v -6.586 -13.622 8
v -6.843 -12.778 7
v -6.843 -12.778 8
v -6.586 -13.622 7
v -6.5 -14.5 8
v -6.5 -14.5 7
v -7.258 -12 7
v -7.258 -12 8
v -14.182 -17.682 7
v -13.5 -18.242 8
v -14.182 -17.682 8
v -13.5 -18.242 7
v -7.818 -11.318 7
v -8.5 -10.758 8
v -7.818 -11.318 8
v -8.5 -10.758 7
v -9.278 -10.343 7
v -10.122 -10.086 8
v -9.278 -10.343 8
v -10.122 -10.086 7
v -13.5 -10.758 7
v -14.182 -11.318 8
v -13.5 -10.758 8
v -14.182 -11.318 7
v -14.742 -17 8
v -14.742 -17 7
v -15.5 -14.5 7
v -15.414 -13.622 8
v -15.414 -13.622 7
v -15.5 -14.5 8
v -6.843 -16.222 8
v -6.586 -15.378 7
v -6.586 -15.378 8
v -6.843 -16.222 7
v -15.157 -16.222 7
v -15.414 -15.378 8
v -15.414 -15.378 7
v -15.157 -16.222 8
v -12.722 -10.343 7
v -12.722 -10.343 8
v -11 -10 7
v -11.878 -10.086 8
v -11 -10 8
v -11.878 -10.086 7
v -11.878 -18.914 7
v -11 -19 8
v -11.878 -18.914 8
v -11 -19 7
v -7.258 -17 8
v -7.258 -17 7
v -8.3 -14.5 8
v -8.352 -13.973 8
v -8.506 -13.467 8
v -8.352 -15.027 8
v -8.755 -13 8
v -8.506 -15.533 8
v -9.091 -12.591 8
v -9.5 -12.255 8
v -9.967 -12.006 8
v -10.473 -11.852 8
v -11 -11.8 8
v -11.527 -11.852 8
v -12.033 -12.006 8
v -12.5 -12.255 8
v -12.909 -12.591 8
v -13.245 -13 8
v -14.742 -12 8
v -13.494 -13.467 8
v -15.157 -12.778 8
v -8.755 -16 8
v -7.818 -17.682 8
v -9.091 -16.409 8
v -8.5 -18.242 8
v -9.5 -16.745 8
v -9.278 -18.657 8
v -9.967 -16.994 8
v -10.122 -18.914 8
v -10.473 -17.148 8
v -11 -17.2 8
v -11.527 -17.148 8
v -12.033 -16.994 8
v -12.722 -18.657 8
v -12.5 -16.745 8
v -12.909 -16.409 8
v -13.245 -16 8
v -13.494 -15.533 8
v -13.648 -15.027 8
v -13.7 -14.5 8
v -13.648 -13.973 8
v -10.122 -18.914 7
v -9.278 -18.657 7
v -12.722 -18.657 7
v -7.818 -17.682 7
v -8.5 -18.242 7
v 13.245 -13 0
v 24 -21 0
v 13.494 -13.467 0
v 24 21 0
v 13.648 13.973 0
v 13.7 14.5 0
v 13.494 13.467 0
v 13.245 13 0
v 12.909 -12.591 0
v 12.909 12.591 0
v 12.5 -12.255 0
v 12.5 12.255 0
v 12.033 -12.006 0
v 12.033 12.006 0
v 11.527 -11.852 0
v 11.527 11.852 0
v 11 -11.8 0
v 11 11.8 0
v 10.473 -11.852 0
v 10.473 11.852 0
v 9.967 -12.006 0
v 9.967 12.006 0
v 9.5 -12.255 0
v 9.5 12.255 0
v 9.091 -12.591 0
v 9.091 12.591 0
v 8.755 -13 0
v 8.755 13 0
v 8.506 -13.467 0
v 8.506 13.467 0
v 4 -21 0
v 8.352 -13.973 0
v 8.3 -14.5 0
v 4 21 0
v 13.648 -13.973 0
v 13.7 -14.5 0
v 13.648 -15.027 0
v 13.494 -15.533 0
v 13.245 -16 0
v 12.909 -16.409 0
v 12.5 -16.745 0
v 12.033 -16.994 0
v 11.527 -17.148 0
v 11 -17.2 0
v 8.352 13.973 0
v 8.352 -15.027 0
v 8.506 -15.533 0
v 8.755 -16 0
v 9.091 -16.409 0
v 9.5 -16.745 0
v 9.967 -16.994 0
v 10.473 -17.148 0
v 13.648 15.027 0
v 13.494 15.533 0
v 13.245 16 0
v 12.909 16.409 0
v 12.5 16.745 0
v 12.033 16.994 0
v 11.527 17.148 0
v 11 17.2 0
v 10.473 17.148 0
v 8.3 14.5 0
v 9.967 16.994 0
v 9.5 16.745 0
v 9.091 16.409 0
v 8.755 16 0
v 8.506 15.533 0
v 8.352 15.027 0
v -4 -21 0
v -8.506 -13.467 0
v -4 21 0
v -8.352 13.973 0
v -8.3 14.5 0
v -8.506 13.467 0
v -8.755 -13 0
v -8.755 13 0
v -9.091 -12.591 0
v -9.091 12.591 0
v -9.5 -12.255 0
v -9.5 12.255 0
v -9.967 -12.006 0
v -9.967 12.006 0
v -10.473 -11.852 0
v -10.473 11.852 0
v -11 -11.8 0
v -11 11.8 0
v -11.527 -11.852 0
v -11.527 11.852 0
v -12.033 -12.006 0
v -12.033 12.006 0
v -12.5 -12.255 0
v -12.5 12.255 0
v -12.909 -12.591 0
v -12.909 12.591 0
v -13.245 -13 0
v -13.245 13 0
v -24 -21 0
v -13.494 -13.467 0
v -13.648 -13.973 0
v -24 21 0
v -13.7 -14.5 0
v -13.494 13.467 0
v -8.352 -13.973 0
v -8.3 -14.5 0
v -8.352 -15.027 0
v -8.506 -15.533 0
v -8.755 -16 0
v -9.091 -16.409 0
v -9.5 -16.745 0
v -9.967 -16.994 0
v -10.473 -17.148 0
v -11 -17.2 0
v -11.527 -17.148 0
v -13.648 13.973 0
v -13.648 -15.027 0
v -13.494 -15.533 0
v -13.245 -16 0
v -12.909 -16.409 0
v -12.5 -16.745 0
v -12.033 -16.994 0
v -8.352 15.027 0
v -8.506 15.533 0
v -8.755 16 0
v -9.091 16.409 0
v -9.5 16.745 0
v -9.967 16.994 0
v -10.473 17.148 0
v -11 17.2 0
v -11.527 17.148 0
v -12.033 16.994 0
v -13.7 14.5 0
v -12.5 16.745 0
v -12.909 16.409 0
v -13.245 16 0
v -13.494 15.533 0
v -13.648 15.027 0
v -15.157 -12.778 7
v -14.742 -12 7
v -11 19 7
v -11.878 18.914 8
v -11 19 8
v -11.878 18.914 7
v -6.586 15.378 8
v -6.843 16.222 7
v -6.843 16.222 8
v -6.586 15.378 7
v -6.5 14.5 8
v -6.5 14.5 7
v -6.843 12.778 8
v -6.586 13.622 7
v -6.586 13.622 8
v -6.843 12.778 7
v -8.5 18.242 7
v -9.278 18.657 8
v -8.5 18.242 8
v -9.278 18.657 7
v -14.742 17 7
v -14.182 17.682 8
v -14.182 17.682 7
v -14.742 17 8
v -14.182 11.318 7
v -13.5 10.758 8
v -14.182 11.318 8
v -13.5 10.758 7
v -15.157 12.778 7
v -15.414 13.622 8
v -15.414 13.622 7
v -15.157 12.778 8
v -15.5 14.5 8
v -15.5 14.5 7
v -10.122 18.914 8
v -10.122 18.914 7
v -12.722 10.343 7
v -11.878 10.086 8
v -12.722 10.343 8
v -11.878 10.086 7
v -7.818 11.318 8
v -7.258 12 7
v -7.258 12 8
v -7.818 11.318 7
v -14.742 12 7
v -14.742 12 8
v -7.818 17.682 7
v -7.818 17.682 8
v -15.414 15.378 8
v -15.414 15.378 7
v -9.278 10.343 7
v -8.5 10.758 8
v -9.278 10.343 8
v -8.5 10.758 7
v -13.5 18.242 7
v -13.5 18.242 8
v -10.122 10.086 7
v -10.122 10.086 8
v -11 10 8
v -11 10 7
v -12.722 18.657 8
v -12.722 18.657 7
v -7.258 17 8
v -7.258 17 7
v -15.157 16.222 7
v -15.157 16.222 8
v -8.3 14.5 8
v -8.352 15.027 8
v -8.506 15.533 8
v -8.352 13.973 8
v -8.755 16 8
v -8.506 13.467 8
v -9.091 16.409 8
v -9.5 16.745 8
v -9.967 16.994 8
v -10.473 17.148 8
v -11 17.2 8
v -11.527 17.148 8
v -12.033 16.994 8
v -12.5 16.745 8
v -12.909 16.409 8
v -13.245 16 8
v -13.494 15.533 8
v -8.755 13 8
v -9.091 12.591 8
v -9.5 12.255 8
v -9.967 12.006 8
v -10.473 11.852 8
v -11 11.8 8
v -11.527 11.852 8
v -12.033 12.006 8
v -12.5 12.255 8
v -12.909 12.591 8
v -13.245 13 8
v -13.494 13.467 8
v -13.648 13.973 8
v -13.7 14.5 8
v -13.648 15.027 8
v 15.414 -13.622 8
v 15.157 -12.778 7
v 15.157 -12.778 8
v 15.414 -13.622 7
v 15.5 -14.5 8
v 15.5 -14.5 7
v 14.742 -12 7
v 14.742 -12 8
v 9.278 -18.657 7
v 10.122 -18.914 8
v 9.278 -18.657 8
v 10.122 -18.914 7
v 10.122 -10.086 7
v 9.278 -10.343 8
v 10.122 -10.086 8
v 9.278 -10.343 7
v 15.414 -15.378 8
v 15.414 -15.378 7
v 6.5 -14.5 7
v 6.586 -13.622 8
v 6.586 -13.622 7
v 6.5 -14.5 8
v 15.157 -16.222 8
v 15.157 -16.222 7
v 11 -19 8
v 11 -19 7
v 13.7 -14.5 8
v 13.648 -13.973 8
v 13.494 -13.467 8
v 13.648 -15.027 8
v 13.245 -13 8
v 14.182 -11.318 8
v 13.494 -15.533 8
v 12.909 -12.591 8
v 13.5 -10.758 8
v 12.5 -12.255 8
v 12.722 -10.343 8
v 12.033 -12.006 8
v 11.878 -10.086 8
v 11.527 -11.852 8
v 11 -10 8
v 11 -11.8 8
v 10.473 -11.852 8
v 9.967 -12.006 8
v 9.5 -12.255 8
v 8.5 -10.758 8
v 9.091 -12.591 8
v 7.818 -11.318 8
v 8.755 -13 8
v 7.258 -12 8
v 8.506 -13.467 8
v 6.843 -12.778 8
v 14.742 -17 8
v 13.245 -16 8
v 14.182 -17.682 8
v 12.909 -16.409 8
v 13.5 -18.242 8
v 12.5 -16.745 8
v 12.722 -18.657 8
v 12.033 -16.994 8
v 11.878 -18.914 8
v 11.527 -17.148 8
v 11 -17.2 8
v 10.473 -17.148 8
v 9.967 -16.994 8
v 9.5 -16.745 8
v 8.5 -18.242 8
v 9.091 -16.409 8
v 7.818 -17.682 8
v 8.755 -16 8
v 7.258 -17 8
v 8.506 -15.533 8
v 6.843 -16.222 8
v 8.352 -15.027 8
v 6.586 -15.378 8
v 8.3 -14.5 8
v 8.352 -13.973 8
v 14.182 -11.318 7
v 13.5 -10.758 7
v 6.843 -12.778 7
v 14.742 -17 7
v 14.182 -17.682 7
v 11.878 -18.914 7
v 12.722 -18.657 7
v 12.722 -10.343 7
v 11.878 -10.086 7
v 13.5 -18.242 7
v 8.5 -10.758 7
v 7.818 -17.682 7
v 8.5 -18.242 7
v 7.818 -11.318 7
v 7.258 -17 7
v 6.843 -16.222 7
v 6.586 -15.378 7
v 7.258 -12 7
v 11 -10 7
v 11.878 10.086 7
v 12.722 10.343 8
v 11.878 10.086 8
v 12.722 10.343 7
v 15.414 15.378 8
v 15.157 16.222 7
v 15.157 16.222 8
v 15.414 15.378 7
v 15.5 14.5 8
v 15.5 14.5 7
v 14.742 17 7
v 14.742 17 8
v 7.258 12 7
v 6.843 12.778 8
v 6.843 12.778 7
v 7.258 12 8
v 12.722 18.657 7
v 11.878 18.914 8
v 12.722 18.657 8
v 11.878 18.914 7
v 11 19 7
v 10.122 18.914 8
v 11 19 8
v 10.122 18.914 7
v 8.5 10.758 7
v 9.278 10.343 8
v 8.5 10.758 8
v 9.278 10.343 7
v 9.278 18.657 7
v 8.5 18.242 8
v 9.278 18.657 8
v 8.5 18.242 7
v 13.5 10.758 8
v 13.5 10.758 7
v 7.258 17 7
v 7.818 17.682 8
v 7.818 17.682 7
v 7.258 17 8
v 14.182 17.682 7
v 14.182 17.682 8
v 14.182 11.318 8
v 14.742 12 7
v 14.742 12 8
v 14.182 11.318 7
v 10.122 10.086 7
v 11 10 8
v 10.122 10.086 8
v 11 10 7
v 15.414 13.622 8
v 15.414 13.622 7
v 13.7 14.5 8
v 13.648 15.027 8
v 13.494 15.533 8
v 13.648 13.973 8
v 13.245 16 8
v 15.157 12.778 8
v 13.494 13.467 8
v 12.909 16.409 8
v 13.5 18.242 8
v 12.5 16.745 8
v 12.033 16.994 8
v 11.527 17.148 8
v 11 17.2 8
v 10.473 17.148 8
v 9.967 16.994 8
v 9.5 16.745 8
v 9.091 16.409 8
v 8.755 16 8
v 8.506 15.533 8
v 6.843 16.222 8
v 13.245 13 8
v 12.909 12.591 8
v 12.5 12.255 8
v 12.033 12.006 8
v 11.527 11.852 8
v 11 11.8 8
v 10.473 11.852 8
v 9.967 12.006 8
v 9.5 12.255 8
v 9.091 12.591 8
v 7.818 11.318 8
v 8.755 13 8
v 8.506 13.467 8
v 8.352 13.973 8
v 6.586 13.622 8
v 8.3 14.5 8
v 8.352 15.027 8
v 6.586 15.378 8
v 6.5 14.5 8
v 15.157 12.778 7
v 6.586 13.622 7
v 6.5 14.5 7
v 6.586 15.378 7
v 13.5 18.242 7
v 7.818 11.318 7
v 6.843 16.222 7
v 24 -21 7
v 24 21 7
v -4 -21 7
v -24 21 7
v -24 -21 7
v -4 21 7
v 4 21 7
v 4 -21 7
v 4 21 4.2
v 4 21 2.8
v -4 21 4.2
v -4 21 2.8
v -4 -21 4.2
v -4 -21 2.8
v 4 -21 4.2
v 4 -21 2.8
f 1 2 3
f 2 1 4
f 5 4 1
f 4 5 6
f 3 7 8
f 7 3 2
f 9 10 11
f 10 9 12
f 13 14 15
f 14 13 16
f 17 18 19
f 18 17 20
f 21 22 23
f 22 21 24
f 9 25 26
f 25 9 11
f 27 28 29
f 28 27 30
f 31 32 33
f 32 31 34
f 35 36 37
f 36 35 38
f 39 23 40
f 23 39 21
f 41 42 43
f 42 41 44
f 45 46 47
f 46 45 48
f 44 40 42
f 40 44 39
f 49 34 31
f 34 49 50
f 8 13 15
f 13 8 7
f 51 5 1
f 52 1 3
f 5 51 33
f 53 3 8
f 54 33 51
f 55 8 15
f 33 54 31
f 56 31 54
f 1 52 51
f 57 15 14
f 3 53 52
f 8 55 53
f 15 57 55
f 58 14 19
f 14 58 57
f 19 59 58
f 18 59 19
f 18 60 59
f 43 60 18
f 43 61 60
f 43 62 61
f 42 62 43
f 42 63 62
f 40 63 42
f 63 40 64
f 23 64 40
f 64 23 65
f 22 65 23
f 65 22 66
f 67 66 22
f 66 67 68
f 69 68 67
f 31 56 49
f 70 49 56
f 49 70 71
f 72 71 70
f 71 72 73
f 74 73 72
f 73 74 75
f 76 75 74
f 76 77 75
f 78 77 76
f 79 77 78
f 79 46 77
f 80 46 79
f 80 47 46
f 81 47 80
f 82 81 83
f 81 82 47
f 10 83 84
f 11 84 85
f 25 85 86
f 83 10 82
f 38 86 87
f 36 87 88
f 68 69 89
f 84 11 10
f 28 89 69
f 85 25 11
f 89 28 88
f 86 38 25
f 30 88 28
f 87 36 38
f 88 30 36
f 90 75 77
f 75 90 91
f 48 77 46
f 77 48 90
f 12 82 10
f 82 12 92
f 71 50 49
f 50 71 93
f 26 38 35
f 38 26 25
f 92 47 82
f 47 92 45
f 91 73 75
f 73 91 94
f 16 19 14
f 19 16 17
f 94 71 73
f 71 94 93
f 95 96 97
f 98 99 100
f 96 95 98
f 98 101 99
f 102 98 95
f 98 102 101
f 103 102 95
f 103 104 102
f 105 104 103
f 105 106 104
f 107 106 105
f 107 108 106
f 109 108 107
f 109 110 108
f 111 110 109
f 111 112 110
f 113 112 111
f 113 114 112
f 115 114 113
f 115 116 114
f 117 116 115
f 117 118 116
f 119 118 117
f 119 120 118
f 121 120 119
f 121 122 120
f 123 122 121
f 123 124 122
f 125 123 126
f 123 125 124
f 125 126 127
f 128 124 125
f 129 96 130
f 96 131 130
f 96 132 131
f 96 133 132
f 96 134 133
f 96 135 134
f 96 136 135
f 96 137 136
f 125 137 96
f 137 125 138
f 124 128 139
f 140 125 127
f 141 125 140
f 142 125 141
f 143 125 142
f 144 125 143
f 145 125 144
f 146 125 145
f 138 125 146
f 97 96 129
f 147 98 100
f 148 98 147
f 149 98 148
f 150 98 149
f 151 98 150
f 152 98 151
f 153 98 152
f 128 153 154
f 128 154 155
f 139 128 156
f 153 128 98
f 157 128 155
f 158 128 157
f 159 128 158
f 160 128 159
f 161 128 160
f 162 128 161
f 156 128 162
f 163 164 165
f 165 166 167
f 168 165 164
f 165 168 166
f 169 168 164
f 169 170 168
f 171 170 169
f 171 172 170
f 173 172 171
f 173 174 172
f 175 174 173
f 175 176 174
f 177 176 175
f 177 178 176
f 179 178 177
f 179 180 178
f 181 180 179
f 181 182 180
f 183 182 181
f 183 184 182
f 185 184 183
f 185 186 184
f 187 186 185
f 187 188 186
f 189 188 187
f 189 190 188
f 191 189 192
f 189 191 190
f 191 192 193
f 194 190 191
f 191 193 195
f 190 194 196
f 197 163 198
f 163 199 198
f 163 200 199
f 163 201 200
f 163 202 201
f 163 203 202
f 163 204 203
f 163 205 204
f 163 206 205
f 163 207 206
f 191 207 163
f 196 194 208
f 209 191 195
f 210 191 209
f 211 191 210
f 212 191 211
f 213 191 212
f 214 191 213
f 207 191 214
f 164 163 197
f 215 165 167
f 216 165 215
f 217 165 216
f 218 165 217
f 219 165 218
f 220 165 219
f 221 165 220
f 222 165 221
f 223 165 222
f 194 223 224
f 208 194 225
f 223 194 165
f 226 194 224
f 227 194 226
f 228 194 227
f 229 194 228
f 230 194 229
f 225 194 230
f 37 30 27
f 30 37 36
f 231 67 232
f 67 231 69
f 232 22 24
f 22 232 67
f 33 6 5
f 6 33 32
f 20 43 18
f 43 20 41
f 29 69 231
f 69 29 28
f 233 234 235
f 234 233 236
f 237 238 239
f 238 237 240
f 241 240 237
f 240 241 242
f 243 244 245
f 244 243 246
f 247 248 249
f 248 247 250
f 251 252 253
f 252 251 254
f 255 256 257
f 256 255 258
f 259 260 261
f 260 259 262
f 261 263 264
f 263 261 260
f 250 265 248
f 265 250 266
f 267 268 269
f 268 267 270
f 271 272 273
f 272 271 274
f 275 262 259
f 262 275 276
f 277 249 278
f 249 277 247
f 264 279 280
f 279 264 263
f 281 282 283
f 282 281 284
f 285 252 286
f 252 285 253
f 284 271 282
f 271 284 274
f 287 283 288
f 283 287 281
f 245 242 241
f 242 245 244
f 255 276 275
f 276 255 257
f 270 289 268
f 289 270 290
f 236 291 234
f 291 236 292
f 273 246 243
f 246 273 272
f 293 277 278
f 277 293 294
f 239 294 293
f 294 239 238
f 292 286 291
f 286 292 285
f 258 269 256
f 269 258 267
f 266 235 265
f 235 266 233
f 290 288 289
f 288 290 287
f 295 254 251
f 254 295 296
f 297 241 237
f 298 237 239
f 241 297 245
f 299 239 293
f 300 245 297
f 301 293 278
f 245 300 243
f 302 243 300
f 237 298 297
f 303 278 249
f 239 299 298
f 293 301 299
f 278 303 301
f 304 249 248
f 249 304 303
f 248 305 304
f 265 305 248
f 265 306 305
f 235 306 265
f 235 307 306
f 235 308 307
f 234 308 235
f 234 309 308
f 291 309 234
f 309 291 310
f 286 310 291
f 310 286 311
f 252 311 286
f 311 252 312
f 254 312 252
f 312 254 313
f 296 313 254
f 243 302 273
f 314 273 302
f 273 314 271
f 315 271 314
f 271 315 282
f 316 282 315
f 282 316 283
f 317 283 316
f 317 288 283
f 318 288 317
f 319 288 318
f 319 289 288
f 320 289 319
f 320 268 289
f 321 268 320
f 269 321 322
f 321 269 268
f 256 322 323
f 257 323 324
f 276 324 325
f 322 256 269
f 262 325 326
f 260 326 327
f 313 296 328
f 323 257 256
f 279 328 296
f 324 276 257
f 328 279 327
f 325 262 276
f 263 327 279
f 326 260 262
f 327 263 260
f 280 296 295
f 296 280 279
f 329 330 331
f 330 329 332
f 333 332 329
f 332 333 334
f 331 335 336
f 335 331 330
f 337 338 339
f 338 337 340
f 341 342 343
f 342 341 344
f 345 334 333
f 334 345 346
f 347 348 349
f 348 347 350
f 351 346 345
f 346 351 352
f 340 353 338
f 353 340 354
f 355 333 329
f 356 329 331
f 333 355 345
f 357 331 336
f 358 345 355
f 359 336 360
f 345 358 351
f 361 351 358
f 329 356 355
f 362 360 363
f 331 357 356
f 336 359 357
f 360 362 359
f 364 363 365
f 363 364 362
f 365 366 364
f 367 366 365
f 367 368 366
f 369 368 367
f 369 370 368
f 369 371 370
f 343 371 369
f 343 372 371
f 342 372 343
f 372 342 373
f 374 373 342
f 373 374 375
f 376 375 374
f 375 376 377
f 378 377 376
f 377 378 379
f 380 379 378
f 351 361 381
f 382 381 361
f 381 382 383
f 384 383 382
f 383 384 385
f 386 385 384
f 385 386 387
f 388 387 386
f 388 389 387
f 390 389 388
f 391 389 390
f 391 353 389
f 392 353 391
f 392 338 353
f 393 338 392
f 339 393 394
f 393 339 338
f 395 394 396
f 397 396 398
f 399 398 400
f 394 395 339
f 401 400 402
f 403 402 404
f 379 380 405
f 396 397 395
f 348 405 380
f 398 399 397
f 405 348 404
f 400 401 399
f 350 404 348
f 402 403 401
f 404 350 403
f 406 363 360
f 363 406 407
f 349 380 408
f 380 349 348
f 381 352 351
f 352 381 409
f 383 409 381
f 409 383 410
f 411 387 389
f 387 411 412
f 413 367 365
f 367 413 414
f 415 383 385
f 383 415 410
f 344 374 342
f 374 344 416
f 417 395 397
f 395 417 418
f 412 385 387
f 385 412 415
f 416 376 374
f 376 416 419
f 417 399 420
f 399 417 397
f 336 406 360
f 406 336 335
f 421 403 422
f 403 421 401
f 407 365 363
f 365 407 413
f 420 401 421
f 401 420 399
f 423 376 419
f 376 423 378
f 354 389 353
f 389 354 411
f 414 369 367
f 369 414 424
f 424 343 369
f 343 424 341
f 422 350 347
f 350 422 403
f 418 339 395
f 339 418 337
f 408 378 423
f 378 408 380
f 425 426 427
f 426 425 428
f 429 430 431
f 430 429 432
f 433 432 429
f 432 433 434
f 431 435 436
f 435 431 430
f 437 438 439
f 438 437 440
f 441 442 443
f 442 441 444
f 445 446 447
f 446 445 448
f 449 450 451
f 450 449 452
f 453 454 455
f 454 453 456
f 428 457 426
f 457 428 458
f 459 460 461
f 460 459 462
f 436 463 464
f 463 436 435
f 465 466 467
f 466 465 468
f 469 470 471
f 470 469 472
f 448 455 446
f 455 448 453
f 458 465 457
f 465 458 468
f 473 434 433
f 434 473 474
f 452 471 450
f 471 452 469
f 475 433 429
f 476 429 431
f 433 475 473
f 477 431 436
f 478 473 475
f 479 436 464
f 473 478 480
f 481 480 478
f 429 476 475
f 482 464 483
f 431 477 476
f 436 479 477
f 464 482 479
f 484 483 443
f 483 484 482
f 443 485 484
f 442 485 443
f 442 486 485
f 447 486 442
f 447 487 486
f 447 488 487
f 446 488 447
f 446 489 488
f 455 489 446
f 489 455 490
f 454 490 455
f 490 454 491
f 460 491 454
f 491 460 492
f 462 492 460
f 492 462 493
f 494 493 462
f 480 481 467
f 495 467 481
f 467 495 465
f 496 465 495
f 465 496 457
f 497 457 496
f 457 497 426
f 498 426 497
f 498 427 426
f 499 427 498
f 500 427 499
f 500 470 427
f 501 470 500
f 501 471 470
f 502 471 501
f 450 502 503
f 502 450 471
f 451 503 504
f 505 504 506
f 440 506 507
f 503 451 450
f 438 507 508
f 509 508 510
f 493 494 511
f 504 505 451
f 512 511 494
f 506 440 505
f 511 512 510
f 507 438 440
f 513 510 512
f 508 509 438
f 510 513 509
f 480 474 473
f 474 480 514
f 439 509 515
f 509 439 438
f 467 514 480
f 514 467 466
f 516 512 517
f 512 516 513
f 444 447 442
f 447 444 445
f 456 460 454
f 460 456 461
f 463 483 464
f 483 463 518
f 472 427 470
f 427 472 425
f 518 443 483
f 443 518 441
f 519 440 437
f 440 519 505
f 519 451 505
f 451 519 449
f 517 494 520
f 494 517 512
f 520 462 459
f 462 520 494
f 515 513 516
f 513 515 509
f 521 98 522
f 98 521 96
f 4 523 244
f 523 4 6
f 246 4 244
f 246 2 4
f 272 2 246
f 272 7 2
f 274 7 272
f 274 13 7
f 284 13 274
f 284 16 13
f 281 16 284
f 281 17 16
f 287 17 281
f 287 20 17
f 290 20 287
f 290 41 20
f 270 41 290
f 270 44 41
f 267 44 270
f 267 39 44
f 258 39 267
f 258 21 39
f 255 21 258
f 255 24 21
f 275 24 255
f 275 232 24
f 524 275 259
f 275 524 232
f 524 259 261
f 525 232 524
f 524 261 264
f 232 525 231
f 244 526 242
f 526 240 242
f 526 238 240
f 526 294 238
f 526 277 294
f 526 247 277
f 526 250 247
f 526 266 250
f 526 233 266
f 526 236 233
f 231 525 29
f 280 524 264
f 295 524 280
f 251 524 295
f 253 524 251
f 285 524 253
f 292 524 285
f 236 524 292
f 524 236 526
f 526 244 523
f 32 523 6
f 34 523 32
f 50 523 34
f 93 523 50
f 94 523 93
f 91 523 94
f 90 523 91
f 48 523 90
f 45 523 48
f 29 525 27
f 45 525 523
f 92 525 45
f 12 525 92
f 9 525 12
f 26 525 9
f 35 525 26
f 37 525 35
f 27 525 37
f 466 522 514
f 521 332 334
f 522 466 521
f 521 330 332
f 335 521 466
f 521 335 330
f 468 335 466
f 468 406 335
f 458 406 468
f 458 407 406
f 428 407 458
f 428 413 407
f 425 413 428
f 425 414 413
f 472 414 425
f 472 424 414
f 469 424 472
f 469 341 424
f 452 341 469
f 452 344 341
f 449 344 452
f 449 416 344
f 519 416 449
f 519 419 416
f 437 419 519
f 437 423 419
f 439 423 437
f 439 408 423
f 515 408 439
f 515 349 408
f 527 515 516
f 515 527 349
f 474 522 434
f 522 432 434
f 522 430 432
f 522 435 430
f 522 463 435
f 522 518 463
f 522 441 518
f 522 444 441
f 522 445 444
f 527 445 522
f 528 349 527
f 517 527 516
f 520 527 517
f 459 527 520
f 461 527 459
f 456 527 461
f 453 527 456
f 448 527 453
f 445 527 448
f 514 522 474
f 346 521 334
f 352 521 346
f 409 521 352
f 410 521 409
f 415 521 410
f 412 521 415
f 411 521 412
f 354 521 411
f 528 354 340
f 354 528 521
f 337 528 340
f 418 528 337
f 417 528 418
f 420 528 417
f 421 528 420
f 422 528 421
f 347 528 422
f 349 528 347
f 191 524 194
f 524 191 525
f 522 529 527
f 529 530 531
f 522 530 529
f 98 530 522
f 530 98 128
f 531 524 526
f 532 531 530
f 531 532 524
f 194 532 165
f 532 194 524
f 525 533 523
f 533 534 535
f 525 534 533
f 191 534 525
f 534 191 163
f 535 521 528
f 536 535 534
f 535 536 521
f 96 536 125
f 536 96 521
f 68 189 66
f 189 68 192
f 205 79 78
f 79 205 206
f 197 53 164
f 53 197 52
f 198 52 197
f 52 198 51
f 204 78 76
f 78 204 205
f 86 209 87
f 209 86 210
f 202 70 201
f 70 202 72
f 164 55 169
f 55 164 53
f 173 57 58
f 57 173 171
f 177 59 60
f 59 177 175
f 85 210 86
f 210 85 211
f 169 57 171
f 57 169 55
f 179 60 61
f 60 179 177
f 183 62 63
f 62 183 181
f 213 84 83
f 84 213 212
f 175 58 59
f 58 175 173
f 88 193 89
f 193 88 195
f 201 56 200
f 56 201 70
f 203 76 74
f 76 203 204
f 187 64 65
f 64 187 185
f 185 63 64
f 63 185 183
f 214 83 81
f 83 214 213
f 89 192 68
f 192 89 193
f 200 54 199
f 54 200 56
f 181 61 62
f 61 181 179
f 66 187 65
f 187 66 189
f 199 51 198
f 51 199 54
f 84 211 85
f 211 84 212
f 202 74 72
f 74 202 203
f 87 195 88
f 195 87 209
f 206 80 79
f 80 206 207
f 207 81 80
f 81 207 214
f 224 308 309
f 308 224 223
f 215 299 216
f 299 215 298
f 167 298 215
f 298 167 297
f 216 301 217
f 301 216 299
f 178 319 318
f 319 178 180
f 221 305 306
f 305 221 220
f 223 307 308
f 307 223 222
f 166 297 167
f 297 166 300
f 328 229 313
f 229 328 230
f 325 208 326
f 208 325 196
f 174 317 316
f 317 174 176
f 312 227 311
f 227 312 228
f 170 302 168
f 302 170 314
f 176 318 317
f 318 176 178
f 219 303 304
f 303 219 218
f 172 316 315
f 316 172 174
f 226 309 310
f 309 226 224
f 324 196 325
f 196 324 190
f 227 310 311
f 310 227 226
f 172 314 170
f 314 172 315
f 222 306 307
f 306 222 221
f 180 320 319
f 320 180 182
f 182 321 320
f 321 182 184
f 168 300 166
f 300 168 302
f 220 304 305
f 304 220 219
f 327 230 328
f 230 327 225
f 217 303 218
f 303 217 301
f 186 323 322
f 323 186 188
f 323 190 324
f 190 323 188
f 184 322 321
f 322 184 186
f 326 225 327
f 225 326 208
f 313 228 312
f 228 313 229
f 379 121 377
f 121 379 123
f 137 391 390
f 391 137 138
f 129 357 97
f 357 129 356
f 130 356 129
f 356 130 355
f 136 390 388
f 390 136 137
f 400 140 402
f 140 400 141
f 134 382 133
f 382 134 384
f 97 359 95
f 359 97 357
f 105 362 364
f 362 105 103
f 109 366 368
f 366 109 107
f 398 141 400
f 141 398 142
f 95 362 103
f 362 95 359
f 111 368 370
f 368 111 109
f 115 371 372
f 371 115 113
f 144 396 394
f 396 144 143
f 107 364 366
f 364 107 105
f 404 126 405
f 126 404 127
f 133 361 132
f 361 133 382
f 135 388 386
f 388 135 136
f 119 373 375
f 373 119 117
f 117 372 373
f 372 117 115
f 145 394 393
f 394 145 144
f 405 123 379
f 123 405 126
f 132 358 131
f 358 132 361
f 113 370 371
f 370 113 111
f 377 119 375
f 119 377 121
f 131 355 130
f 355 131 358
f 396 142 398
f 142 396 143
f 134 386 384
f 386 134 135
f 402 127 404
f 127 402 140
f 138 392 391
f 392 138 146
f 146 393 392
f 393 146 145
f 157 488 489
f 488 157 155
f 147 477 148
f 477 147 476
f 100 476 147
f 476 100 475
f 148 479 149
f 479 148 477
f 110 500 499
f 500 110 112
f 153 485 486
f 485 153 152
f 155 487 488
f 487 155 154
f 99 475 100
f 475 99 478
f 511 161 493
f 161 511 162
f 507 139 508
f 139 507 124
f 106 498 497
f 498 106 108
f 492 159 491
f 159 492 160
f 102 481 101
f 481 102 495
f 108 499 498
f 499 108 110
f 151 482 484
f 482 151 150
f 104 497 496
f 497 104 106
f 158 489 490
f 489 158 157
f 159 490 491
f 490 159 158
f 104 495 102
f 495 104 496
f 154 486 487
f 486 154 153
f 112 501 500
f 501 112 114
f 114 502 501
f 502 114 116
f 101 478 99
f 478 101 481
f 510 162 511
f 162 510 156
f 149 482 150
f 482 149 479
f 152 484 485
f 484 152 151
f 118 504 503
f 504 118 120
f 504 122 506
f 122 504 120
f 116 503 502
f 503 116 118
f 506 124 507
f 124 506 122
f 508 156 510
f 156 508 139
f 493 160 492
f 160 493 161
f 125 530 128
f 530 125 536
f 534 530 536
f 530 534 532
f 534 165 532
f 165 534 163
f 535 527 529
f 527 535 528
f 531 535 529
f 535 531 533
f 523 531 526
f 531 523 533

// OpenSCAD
$fn = 32;

// ----------------------------------------------------------------------
// Living hinge: 48 x 42 mm plates, 1.4 mm flexible web
// ----------------------------------------------------------------------

// --- parameters (mm) ---
plate_len = 20;           // plate length outside the web
plate_w = 42;             // plate width
thick = 7;                // plate thickness
web_half = 4;             // half width of the flex band
web_t = 1.4;              // flexible web thickness
web_z = 2.8;              // web position inside the thickness
boss_d = 9;               // screw boss diameter
boss_h = 8;               // screw boss height
boss_x = 11;              // screw boss distance from the web
screw_d = 5.4;            // screw hole

difference() {
  union() {
    /* one flat strip, later thinned at the middle */
    translate([-24, -21, 0]) cube([48, 42, 7]);
    /* screw bosses, sunk 0.5 mm into the plates */
    for (sx = [-11, 11]) {
      for (sy = [-14.5, 14.5]) {
        translate([sx, sy, 0]) cylinder(h = boss_h, d = boss_d);
      }
    }
  }
  /* channel from below: leaves the web on top of it */
  translate([-4, -23.5, -2.5]) cube([8, 47, 5.3]);
  /* channel from above: thins the web down to web_t */
  translate([-4, -23.5, 4.2]) cube([8, 47, 5.3]);
  /* screw holes through the bosses */
  for (sx = [-11, 11]) {
    for (sy = [-14.5, 14.5]) {
      translate([sx, sy, -2.5]) cylinder(h = boss_h + 5, d = screw_d);
    }
  }
}
